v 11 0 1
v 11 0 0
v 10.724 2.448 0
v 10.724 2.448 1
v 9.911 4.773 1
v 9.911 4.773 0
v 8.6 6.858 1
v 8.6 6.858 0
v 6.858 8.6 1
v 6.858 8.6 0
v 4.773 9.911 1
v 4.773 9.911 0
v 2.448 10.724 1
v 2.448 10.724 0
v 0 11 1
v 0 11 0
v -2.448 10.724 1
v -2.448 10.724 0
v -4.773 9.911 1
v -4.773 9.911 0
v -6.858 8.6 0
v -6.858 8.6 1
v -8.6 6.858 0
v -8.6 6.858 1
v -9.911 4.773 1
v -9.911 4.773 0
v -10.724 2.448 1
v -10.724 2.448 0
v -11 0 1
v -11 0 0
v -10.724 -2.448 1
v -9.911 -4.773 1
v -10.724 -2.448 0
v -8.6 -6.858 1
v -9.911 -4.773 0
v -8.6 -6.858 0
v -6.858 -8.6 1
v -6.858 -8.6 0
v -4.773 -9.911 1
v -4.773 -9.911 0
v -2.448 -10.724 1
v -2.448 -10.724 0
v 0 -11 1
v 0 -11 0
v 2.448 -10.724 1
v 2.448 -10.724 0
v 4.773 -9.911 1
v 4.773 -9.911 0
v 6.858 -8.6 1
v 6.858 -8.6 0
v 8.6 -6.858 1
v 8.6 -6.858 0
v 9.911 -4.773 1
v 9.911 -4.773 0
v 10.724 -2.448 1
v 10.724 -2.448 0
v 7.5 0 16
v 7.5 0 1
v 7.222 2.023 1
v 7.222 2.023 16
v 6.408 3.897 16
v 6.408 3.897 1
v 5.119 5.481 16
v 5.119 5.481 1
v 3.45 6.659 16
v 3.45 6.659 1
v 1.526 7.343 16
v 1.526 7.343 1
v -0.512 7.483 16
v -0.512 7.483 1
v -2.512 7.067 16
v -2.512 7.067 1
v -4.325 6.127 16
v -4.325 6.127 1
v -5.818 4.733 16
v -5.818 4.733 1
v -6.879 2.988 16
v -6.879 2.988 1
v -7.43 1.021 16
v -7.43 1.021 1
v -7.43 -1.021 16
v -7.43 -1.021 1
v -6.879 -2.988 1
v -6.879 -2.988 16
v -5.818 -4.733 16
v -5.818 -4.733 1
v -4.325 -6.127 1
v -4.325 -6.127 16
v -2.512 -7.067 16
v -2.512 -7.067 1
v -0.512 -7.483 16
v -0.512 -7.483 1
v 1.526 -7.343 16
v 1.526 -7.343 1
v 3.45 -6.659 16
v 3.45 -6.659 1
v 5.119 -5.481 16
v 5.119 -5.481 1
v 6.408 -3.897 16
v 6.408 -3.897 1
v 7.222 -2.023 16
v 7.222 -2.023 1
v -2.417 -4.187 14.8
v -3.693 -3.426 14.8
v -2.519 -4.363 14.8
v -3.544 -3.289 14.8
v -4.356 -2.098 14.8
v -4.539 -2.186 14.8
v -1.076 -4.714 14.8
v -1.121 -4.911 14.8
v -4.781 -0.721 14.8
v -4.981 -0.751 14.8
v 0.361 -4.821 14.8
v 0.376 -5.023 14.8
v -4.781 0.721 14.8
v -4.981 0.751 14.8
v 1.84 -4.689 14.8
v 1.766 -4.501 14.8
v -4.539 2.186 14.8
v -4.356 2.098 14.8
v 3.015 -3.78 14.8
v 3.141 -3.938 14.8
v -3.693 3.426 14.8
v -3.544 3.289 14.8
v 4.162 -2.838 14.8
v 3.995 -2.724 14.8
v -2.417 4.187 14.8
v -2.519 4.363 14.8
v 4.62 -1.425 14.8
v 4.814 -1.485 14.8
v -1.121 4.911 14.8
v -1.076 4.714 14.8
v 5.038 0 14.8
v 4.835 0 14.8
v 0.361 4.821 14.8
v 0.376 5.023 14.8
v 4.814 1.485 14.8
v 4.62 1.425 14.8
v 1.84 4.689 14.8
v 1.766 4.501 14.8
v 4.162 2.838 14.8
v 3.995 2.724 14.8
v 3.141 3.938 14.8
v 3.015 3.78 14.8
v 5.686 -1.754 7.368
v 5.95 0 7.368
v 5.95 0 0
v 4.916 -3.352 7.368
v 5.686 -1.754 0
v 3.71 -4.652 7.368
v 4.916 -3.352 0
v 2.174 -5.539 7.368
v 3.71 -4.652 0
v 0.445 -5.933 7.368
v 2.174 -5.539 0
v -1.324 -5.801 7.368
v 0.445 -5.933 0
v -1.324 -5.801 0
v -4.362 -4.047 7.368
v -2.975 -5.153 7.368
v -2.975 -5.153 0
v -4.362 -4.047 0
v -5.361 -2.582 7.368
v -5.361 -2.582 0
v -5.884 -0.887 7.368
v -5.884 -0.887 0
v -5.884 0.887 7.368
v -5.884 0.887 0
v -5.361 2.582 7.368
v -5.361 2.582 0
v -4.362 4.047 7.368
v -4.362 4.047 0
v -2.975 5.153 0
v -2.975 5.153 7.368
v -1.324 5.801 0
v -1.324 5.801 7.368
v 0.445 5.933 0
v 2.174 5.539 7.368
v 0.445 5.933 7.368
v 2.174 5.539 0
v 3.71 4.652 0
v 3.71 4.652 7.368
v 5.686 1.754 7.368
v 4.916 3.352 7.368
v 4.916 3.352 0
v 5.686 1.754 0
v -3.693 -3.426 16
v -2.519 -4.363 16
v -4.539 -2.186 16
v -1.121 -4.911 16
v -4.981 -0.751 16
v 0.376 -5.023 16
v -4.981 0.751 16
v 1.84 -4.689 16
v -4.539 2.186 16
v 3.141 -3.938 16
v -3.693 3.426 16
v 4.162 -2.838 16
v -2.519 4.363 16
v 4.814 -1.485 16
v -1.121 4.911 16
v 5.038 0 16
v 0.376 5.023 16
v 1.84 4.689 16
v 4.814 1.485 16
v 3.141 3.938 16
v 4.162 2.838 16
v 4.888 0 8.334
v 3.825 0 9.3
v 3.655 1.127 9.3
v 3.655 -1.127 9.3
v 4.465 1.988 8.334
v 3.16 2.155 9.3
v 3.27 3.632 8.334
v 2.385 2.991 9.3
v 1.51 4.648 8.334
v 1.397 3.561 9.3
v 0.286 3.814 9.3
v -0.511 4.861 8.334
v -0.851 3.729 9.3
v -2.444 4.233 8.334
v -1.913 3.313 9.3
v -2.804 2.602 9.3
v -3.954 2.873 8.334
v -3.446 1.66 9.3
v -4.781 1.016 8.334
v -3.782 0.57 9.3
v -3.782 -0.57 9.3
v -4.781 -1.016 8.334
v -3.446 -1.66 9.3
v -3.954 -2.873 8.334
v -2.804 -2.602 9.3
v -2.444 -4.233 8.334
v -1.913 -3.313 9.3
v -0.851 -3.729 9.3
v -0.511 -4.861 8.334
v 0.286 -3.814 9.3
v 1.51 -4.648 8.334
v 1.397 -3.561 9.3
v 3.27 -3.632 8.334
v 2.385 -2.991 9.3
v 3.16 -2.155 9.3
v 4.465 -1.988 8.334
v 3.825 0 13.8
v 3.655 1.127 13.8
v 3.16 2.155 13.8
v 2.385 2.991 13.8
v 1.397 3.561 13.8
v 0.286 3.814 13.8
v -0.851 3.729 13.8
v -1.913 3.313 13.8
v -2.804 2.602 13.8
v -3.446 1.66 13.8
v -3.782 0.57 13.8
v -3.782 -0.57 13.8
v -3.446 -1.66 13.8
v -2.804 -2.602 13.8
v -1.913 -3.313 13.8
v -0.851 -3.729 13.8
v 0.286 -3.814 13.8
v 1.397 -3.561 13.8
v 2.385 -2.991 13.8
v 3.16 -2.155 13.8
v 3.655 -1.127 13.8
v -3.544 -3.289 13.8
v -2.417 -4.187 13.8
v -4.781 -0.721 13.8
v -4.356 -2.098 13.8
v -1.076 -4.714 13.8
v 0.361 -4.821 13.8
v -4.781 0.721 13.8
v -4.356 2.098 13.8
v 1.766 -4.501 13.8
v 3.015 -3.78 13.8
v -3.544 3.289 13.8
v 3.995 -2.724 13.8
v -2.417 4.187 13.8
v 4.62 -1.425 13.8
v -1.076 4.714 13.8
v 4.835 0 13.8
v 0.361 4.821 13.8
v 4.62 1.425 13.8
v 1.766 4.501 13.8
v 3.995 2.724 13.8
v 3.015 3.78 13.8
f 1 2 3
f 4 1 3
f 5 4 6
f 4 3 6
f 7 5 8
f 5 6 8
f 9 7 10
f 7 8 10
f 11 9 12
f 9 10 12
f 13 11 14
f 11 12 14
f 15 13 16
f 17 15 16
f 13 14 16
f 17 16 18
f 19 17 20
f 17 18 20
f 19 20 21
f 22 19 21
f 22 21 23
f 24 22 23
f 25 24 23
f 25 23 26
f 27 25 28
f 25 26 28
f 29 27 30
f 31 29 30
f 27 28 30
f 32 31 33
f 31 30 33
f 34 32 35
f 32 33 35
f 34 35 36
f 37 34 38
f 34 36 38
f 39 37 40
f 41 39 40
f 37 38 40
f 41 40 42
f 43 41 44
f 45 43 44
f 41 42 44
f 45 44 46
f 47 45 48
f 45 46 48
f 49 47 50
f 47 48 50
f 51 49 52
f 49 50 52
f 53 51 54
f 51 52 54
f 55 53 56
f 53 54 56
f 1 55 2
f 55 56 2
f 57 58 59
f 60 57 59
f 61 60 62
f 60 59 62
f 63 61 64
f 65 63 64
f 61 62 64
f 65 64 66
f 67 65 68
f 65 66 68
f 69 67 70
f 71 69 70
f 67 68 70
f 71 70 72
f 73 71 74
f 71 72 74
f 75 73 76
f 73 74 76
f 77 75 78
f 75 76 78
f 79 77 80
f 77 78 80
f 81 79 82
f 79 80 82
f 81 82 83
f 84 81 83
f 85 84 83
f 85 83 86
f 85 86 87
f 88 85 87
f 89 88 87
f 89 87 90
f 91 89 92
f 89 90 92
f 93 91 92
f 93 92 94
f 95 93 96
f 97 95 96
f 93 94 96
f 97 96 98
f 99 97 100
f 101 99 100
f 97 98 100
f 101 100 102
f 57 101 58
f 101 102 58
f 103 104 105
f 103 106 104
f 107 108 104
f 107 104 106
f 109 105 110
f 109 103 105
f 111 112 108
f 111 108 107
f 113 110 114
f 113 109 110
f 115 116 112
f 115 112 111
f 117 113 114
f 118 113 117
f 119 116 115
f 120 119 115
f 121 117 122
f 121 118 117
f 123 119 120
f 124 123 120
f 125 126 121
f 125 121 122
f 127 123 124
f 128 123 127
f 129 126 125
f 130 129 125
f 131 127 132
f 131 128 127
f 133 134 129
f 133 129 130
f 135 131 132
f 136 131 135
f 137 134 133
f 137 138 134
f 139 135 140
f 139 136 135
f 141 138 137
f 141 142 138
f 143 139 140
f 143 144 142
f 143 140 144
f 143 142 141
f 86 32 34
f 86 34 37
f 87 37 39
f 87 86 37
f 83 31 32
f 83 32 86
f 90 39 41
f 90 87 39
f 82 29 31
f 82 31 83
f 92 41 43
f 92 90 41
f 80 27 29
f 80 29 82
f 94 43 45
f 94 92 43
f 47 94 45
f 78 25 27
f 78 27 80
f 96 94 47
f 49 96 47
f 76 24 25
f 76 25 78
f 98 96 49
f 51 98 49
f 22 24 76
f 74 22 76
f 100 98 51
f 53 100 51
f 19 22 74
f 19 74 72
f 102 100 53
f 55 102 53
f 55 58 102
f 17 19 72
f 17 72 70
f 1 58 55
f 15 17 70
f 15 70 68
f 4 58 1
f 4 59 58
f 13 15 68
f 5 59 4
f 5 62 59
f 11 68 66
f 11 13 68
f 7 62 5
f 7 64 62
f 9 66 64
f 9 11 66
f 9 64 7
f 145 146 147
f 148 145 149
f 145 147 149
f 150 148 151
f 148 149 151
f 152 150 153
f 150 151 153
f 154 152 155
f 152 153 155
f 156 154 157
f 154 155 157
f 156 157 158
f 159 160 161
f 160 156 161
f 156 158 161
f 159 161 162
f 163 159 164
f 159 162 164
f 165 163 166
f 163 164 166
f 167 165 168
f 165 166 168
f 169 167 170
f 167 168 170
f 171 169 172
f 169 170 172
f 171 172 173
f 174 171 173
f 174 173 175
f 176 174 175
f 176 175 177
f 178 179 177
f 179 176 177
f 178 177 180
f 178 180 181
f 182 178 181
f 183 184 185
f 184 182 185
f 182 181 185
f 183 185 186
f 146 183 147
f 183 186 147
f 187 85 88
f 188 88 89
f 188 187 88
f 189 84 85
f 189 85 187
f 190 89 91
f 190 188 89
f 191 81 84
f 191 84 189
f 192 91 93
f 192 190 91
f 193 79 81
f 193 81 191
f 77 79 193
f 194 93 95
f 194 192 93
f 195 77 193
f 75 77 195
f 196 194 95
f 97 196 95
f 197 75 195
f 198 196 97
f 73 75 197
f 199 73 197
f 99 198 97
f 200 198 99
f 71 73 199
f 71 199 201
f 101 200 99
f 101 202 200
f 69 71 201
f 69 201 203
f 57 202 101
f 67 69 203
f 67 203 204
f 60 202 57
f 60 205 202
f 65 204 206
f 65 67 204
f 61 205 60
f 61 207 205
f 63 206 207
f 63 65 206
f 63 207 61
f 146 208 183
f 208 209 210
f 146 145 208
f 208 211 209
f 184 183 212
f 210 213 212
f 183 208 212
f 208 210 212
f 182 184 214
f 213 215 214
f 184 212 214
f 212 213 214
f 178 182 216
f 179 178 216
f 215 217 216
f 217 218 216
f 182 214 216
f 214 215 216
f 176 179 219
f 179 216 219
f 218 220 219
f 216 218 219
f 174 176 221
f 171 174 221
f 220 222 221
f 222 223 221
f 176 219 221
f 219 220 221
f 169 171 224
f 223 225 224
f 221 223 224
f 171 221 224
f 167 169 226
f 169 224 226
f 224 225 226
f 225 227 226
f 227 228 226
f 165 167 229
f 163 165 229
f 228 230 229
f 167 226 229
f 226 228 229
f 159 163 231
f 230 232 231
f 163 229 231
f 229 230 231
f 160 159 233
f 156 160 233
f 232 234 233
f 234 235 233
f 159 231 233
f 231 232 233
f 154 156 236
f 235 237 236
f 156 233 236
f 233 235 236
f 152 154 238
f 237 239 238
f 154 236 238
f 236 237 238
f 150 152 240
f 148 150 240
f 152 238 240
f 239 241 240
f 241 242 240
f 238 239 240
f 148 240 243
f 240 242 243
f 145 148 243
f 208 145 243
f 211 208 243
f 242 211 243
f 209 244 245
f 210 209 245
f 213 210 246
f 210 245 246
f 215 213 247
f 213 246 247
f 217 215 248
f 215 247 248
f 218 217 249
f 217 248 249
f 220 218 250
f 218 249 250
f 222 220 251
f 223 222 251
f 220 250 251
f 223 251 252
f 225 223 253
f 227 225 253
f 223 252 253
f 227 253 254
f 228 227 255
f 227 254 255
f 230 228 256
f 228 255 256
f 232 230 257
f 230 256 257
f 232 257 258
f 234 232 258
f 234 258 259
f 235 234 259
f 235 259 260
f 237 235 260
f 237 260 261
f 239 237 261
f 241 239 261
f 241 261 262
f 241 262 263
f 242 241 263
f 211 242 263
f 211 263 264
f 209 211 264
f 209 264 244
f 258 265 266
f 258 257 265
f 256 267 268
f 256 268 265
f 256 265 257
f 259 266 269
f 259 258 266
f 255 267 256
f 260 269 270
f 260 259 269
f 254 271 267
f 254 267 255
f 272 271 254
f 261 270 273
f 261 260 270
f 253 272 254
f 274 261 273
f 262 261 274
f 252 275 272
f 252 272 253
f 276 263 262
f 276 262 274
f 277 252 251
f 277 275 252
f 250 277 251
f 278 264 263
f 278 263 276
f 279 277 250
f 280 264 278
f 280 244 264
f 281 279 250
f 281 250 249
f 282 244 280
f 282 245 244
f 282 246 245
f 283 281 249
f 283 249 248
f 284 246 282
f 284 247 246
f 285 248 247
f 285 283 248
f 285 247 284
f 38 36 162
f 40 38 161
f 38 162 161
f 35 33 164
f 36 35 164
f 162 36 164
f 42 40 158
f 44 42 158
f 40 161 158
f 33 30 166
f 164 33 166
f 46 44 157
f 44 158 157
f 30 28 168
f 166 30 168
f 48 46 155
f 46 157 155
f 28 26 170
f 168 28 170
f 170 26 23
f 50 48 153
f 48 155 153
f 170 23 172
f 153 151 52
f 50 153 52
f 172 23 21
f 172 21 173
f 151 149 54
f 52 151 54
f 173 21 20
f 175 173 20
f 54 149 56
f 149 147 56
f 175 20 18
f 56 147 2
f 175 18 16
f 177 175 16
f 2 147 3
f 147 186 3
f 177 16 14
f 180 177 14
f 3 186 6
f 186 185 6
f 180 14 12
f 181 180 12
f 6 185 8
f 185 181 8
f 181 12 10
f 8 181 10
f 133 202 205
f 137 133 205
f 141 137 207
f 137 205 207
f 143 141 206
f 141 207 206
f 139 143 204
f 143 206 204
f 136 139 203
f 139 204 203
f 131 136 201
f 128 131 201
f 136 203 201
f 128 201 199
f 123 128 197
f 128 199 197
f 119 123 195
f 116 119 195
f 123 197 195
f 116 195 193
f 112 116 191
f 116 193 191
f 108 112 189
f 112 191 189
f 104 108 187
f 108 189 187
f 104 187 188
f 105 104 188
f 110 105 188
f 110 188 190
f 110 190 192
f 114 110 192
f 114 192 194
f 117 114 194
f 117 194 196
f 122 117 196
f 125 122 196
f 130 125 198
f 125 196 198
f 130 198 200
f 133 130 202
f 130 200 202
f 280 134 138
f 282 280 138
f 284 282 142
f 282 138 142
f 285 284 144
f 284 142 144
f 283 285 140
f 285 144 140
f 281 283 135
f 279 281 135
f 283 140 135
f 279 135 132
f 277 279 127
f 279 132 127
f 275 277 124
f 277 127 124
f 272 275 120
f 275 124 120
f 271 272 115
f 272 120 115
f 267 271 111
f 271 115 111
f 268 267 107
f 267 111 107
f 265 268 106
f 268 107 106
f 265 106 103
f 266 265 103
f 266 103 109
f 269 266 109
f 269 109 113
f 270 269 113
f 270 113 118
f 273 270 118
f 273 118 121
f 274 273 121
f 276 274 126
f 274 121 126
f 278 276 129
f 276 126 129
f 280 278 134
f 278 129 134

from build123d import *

# Parameters (mm, degrees)
F0_R         = 11
F1_DEPTH     = 1
F2_R         = 7.5
F3_DEPTH     = 15
F4_R         = 3.825
F5_DEPTH     = 25
F6_R         = 5.95
F7_DEPTH     = 7.3
F8_R         = 5.0375
F8_R_2       = 3.825
F9_DEPTH     = 1.2
F10_S5_R     = 5.95
F10_T6_DEPTH = 10
F11_R        = 4.834999796
F11_R_2      = 3.825
F12_DEPTH    = 1


# Not quite as in the source:
# - a fillet or chamfer that OpenCascade refuses, or shapes differently, is made with other operations: its cross-section is extruded or revolved along the edge and cut away or added


with BuildPart() as f1:
    # F0 (on Top) → F1 (new body)
    with BuildSketch(Plane.XY):
        Circle(F0_R)
    extrude(amount=F1_DEPTH)

    # F2 (on face) → F3 (join)
    with BuildSketch(Plane.XY.offset(1)):
        Circle(F2_R)
    extrude(amount=F3_DEPTH)

    # F4 (on face) → F5 (cut)
    with BuildSketch(Plane.XY.offset(16)):
        Circle(F4_R)
    extrude(amount=-F5_DEPTH, mode=Mode.SUBTRACT)

    # F6 (on face) → F7 (cut)
    with BuildSketch(Plane(origin=(0, 0, 0), x_dir=(1, 0, 0), z_dir=(0, 0, -1))):
        Circle(F6_R)
    extrude(amount=-F7_DEPTH, mode=Mode.SUBTRACT)

    # F8 (on face) → F9 (cut)
    with BuildSketch(Plane.XY.offset(16)):
        Circle(F8_R)
        Circle(F8_R_2, mode=Mode.SUBTRACT)
    extrude(amount=-F9_DEPTH, mode=Mode.SUBTRACT)

    # F10: chamfer of 2.2 x 2 on 1 edges, made by hand


with BuildPart() as f10_tool2:
    # F10_s3 → F10_t4 (revolve)
    with BuildSketch(Plane.XZ):
        Polygon((6.025, 7.3), (3.825, 9.3), (3.825, 7.3), align=None)
    revolve(axis=Axis((0, 0, 7.3), (0, 0, 1)))

    # F10_s5 → F10_t6 (intersect, symmetric)
    with BuildSketch(Plane.XY.offset(8.3)):
        Circle(F10_S5_R)
    extrude(amount=F10_T6_DEPTH, both=True, mode=Mode.INTERSECT)


with BuildPart() as f1_1:
    add(f1.part)

    # F10_t1: cut F10_tool2
    add(f10_tool2.part, mode=Mode.SUBTRACT)

    # F11 (on face) → F12 (cut)
    with BuildSketch(Plane.XY.offset(14.8)):
        Circle(F11_R)
        Circle(F11_R_2, mode=Mode.SUBTRACT)
    extrude(amount=-F12_DEPTH, mode=Mode.SUBTRACT)


solid = f1_1.part
